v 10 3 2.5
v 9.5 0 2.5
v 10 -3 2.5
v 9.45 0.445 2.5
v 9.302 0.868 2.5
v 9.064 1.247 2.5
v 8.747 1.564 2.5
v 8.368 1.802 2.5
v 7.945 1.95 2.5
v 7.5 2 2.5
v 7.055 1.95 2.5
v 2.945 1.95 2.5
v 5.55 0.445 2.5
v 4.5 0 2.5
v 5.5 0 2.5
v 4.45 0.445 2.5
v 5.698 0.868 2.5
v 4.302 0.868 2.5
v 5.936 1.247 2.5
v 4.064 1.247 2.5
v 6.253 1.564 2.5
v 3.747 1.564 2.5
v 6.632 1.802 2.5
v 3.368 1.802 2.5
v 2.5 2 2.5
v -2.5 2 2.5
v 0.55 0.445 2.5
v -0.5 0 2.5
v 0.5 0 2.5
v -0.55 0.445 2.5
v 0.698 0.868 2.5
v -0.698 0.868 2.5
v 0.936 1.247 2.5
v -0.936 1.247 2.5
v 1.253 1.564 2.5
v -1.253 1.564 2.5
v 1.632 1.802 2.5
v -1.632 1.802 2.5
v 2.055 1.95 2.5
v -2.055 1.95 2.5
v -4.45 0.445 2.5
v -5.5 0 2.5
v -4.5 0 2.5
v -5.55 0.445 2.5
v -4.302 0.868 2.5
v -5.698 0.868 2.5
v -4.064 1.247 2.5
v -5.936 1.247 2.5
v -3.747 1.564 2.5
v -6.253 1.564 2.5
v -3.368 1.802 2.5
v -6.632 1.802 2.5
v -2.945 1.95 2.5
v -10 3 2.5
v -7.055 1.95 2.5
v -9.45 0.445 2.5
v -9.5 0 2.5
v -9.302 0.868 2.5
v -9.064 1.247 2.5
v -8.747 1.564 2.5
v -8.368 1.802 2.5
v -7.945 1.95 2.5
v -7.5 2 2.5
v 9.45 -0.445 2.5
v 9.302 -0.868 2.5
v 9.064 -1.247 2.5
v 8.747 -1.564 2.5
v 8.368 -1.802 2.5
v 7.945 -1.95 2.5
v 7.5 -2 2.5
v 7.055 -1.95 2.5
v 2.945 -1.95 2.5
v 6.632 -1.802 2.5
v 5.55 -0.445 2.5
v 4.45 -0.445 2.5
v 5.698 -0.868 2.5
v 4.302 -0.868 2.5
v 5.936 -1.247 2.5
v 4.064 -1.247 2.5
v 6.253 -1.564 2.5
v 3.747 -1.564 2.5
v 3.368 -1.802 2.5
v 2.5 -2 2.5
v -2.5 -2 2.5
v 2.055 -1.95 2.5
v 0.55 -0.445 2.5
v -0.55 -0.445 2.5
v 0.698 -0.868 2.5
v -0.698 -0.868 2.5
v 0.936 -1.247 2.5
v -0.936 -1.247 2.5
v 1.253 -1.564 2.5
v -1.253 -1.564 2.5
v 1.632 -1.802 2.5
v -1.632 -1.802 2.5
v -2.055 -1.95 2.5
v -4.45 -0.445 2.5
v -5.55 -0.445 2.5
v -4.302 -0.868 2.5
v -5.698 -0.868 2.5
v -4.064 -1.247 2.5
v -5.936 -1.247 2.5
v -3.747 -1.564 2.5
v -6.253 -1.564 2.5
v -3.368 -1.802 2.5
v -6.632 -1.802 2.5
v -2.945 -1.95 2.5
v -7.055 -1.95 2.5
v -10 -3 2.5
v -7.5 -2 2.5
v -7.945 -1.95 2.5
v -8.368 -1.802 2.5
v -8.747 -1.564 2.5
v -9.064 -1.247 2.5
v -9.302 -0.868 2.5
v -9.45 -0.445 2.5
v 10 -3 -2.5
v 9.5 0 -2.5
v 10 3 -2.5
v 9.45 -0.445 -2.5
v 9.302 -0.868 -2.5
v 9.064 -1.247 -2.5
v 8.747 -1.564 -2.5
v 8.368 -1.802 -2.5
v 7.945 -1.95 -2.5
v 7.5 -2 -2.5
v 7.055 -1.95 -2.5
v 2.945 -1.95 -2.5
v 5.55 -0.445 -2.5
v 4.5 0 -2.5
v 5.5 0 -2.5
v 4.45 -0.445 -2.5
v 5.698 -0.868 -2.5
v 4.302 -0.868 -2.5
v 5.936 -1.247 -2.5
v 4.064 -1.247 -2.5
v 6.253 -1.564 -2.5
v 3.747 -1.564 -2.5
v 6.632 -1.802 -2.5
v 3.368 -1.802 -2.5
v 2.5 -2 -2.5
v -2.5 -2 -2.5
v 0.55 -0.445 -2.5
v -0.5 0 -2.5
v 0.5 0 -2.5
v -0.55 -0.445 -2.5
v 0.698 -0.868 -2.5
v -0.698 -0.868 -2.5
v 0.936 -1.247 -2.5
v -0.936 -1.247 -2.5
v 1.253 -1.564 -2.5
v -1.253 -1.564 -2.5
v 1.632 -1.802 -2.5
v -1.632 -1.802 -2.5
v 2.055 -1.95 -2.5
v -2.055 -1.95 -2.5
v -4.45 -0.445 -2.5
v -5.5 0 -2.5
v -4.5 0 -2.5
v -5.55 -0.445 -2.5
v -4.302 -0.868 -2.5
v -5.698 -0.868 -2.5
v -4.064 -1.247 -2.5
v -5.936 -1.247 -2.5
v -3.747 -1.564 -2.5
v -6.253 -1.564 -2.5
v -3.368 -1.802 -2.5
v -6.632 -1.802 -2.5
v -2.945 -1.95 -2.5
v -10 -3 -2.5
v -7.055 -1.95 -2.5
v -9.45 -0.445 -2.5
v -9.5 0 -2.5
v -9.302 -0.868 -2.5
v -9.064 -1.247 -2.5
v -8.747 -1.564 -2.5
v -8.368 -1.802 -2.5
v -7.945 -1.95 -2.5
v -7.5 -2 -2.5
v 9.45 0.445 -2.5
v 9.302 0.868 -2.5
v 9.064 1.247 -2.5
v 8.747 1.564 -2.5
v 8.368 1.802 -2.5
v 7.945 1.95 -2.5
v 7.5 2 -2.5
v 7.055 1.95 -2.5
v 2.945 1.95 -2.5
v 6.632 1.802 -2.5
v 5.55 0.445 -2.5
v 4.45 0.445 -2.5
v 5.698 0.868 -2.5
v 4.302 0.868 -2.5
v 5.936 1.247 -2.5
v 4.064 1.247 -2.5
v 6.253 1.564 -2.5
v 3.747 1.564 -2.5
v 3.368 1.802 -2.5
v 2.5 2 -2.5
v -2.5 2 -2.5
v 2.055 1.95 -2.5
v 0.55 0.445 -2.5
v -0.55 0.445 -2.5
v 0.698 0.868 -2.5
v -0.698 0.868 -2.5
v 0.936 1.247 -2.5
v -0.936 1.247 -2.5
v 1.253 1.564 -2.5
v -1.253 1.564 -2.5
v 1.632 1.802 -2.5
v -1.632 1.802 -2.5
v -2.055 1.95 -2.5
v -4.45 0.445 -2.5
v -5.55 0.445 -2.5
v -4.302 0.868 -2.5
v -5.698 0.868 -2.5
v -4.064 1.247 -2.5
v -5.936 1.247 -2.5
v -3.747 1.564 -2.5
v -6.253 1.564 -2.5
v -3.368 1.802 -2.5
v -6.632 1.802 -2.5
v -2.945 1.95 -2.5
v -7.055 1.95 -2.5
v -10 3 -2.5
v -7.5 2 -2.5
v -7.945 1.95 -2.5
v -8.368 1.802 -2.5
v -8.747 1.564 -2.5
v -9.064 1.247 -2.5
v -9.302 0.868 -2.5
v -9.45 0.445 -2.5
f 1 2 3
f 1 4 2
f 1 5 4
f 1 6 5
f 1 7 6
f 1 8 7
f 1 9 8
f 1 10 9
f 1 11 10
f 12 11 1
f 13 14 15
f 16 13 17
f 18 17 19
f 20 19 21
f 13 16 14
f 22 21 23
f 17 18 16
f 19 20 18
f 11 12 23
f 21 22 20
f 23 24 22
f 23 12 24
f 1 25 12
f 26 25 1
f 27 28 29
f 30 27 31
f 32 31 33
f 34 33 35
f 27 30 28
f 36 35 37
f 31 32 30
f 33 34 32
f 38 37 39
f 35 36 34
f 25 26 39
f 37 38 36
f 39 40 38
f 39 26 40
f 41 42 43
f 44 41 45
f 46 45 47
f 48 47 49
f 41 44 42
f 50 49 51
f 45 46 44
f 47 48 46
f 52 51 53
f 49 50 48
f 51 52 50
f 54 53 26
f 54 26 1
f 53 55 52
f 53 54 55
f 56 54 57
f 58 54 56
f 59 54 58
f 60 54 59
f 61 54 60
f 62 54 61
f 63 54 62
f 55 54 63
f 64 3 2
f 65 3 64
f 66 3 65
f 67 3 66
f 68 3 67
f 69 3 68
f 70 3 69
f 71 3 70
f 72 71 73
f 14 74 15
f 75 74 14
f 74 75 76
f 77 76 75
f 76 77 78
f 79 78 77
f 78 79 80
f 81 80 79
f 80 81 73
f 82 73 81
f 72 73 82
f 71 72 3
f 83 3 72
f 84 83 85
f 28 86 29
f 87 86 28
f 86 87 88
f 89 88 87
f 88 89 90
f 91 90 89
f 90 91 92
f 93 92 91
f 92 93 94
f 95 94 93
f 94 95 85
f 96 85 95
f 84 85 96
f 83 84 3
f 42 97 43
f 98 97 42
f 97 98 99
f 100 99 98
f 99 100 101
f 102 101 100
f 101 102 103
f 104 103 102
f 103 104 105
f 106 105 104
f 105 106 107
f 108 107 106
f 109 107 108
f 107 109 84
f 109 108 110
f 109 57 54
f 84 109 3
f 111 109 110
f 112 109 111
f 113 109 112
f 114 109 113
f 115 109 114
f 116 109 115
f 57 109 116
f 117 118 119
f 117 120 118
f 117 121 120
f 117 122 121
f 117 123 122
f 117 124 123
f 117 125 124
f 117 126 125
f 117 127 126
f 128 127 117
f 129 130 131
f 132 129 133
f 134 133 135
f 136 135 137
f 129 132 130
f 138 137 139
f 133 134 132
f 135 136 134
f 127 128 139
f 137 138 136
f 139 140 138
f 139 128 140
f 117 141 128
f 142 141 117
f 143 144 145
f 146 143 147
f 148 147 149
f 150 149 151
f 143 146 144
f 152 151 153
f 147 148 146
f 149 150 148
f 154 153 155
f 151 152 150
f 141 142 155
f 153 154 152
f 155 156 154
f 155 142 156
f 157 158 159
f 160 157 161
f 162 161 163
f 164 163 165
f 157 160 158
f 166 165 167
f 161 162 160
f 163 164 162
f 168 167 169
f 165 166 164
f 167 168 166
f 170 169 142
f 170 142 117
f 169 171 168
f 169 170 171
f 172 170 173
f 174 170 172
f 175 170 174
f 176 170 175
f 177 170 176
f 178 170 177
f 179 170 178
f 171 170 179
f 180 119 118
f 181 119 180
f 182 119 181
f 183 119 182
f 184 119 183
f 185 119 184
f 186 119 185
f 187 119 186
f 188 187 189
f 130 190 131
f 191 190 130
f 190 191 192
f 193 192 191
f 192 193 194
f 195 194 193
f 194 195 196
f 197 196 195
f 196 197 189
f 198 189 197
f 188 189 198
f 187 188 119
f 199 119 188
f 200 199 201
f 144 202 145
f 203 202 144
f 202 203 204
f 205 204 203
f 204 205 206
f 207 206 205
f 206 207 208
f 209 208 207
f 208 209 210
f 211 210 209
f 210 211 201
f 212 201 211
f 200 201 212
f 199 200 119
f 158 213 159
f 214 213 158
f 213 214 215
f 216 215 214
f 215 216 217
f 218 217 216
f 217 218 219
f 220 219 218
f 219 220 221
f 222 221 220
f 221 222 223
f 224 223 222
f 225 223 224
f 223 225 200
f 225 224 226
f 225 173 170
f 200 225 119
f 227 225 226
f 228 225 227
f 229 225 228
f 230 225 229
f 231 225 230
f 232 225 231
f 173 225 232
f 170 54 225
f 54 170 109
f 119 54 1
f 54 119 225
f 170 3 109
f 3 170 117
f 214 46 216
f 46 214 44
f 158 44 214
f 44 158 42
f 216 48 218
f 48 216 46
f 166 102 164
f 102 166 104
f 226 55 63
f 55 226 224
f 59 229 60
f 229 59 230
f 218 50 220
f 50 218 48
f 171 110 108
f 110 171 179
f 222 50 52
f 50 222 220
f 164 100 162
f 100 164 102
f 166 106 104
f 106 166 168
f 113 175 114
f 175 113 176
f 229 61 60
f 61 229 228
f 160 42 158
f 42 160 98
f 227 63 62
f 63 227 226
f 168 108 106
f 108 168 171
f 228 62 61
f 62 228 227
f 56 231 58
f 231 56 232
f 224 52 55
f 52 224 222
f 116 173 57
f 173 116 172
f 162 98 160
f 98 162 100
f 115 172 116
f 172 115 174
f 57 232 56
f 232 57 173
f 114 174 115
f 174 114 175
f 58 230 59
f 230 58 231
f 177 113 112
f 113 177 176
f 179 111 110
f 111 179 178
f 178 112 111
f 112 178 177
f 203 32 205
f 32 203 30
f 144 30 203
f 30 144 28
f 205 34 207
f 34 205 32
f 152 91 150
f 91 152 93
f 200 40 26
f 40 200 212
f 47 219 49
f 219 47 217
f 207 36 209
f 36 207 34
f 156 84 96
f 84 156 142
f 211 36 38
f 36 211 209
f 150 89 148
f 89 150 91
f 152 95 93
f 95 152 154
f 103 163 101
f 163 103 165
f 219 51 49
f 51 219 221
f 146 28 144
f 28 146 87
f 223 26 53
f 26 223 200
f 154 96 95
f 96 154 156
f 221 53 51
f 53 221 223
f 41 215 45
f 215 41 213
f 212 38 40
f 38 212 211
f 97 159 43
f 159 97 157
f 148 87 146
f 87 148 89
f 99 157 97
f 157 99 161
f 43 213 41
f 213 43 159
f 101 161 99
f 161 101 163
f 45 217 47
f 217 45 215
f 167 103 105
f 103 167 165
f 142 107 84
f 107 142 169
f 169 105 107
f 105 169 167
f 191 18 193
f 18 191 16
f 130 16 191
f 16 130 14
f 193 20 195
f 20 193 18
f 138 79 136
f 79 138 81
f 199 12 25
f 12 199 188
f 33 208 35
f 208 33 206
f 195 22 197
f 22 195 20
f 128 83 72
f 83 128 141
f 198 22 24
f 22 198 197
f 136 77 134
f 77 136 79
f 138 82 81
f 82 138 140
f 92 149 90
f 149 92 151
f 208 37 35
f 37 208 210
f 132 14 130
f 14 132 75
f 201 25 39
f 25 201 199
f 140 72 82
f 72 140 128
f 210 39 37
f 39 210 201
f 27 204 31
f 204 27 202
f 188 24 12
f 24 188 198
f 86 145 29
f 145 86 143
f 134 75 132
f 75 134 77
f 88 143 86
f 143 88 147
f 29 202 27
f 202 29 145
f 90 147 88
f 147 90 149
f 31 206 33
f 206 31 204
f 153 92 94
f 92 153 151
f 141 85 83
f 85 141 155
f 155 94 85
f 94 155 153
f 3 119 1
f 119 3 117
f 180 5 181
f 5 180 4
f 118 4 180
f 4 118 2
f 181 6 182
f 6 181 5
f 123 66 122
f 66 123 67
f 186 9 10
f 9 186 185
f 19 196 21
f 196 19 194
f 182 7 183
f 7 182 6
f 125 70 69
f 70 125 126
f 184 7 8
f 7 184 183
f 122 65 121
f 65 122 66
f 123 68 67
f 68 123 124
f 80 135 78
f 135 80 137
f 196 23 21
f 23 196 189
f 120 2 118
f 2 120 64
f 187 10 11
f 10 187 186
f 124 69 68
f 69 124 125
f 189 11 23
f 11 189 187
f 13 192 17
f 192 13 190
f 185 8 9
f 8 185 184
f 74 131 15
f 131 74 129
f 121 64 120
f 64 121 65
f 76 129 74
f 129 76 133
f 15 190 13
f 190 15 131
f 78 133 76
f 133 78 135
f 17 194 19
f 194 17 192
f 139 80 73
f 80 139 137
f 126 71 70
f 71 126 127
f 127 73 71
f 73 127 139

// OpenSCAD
/*Basic test file
Written by Julian Stirling, 2018
License: MIT*/


// This is a comment
x=5;
y=6;
z=5;
r=2;
for (n = [-1.5:1:1.5]){
    translate([n*x,0,0]){cubehole([x,y,z],r);}
}

module cubehole(size,holerad)
{
    $fn=28;
    difference()
    {
        cube(size,center=true);
        cylinder(size[2]+1,r=holerad,center=true);
    }
}
